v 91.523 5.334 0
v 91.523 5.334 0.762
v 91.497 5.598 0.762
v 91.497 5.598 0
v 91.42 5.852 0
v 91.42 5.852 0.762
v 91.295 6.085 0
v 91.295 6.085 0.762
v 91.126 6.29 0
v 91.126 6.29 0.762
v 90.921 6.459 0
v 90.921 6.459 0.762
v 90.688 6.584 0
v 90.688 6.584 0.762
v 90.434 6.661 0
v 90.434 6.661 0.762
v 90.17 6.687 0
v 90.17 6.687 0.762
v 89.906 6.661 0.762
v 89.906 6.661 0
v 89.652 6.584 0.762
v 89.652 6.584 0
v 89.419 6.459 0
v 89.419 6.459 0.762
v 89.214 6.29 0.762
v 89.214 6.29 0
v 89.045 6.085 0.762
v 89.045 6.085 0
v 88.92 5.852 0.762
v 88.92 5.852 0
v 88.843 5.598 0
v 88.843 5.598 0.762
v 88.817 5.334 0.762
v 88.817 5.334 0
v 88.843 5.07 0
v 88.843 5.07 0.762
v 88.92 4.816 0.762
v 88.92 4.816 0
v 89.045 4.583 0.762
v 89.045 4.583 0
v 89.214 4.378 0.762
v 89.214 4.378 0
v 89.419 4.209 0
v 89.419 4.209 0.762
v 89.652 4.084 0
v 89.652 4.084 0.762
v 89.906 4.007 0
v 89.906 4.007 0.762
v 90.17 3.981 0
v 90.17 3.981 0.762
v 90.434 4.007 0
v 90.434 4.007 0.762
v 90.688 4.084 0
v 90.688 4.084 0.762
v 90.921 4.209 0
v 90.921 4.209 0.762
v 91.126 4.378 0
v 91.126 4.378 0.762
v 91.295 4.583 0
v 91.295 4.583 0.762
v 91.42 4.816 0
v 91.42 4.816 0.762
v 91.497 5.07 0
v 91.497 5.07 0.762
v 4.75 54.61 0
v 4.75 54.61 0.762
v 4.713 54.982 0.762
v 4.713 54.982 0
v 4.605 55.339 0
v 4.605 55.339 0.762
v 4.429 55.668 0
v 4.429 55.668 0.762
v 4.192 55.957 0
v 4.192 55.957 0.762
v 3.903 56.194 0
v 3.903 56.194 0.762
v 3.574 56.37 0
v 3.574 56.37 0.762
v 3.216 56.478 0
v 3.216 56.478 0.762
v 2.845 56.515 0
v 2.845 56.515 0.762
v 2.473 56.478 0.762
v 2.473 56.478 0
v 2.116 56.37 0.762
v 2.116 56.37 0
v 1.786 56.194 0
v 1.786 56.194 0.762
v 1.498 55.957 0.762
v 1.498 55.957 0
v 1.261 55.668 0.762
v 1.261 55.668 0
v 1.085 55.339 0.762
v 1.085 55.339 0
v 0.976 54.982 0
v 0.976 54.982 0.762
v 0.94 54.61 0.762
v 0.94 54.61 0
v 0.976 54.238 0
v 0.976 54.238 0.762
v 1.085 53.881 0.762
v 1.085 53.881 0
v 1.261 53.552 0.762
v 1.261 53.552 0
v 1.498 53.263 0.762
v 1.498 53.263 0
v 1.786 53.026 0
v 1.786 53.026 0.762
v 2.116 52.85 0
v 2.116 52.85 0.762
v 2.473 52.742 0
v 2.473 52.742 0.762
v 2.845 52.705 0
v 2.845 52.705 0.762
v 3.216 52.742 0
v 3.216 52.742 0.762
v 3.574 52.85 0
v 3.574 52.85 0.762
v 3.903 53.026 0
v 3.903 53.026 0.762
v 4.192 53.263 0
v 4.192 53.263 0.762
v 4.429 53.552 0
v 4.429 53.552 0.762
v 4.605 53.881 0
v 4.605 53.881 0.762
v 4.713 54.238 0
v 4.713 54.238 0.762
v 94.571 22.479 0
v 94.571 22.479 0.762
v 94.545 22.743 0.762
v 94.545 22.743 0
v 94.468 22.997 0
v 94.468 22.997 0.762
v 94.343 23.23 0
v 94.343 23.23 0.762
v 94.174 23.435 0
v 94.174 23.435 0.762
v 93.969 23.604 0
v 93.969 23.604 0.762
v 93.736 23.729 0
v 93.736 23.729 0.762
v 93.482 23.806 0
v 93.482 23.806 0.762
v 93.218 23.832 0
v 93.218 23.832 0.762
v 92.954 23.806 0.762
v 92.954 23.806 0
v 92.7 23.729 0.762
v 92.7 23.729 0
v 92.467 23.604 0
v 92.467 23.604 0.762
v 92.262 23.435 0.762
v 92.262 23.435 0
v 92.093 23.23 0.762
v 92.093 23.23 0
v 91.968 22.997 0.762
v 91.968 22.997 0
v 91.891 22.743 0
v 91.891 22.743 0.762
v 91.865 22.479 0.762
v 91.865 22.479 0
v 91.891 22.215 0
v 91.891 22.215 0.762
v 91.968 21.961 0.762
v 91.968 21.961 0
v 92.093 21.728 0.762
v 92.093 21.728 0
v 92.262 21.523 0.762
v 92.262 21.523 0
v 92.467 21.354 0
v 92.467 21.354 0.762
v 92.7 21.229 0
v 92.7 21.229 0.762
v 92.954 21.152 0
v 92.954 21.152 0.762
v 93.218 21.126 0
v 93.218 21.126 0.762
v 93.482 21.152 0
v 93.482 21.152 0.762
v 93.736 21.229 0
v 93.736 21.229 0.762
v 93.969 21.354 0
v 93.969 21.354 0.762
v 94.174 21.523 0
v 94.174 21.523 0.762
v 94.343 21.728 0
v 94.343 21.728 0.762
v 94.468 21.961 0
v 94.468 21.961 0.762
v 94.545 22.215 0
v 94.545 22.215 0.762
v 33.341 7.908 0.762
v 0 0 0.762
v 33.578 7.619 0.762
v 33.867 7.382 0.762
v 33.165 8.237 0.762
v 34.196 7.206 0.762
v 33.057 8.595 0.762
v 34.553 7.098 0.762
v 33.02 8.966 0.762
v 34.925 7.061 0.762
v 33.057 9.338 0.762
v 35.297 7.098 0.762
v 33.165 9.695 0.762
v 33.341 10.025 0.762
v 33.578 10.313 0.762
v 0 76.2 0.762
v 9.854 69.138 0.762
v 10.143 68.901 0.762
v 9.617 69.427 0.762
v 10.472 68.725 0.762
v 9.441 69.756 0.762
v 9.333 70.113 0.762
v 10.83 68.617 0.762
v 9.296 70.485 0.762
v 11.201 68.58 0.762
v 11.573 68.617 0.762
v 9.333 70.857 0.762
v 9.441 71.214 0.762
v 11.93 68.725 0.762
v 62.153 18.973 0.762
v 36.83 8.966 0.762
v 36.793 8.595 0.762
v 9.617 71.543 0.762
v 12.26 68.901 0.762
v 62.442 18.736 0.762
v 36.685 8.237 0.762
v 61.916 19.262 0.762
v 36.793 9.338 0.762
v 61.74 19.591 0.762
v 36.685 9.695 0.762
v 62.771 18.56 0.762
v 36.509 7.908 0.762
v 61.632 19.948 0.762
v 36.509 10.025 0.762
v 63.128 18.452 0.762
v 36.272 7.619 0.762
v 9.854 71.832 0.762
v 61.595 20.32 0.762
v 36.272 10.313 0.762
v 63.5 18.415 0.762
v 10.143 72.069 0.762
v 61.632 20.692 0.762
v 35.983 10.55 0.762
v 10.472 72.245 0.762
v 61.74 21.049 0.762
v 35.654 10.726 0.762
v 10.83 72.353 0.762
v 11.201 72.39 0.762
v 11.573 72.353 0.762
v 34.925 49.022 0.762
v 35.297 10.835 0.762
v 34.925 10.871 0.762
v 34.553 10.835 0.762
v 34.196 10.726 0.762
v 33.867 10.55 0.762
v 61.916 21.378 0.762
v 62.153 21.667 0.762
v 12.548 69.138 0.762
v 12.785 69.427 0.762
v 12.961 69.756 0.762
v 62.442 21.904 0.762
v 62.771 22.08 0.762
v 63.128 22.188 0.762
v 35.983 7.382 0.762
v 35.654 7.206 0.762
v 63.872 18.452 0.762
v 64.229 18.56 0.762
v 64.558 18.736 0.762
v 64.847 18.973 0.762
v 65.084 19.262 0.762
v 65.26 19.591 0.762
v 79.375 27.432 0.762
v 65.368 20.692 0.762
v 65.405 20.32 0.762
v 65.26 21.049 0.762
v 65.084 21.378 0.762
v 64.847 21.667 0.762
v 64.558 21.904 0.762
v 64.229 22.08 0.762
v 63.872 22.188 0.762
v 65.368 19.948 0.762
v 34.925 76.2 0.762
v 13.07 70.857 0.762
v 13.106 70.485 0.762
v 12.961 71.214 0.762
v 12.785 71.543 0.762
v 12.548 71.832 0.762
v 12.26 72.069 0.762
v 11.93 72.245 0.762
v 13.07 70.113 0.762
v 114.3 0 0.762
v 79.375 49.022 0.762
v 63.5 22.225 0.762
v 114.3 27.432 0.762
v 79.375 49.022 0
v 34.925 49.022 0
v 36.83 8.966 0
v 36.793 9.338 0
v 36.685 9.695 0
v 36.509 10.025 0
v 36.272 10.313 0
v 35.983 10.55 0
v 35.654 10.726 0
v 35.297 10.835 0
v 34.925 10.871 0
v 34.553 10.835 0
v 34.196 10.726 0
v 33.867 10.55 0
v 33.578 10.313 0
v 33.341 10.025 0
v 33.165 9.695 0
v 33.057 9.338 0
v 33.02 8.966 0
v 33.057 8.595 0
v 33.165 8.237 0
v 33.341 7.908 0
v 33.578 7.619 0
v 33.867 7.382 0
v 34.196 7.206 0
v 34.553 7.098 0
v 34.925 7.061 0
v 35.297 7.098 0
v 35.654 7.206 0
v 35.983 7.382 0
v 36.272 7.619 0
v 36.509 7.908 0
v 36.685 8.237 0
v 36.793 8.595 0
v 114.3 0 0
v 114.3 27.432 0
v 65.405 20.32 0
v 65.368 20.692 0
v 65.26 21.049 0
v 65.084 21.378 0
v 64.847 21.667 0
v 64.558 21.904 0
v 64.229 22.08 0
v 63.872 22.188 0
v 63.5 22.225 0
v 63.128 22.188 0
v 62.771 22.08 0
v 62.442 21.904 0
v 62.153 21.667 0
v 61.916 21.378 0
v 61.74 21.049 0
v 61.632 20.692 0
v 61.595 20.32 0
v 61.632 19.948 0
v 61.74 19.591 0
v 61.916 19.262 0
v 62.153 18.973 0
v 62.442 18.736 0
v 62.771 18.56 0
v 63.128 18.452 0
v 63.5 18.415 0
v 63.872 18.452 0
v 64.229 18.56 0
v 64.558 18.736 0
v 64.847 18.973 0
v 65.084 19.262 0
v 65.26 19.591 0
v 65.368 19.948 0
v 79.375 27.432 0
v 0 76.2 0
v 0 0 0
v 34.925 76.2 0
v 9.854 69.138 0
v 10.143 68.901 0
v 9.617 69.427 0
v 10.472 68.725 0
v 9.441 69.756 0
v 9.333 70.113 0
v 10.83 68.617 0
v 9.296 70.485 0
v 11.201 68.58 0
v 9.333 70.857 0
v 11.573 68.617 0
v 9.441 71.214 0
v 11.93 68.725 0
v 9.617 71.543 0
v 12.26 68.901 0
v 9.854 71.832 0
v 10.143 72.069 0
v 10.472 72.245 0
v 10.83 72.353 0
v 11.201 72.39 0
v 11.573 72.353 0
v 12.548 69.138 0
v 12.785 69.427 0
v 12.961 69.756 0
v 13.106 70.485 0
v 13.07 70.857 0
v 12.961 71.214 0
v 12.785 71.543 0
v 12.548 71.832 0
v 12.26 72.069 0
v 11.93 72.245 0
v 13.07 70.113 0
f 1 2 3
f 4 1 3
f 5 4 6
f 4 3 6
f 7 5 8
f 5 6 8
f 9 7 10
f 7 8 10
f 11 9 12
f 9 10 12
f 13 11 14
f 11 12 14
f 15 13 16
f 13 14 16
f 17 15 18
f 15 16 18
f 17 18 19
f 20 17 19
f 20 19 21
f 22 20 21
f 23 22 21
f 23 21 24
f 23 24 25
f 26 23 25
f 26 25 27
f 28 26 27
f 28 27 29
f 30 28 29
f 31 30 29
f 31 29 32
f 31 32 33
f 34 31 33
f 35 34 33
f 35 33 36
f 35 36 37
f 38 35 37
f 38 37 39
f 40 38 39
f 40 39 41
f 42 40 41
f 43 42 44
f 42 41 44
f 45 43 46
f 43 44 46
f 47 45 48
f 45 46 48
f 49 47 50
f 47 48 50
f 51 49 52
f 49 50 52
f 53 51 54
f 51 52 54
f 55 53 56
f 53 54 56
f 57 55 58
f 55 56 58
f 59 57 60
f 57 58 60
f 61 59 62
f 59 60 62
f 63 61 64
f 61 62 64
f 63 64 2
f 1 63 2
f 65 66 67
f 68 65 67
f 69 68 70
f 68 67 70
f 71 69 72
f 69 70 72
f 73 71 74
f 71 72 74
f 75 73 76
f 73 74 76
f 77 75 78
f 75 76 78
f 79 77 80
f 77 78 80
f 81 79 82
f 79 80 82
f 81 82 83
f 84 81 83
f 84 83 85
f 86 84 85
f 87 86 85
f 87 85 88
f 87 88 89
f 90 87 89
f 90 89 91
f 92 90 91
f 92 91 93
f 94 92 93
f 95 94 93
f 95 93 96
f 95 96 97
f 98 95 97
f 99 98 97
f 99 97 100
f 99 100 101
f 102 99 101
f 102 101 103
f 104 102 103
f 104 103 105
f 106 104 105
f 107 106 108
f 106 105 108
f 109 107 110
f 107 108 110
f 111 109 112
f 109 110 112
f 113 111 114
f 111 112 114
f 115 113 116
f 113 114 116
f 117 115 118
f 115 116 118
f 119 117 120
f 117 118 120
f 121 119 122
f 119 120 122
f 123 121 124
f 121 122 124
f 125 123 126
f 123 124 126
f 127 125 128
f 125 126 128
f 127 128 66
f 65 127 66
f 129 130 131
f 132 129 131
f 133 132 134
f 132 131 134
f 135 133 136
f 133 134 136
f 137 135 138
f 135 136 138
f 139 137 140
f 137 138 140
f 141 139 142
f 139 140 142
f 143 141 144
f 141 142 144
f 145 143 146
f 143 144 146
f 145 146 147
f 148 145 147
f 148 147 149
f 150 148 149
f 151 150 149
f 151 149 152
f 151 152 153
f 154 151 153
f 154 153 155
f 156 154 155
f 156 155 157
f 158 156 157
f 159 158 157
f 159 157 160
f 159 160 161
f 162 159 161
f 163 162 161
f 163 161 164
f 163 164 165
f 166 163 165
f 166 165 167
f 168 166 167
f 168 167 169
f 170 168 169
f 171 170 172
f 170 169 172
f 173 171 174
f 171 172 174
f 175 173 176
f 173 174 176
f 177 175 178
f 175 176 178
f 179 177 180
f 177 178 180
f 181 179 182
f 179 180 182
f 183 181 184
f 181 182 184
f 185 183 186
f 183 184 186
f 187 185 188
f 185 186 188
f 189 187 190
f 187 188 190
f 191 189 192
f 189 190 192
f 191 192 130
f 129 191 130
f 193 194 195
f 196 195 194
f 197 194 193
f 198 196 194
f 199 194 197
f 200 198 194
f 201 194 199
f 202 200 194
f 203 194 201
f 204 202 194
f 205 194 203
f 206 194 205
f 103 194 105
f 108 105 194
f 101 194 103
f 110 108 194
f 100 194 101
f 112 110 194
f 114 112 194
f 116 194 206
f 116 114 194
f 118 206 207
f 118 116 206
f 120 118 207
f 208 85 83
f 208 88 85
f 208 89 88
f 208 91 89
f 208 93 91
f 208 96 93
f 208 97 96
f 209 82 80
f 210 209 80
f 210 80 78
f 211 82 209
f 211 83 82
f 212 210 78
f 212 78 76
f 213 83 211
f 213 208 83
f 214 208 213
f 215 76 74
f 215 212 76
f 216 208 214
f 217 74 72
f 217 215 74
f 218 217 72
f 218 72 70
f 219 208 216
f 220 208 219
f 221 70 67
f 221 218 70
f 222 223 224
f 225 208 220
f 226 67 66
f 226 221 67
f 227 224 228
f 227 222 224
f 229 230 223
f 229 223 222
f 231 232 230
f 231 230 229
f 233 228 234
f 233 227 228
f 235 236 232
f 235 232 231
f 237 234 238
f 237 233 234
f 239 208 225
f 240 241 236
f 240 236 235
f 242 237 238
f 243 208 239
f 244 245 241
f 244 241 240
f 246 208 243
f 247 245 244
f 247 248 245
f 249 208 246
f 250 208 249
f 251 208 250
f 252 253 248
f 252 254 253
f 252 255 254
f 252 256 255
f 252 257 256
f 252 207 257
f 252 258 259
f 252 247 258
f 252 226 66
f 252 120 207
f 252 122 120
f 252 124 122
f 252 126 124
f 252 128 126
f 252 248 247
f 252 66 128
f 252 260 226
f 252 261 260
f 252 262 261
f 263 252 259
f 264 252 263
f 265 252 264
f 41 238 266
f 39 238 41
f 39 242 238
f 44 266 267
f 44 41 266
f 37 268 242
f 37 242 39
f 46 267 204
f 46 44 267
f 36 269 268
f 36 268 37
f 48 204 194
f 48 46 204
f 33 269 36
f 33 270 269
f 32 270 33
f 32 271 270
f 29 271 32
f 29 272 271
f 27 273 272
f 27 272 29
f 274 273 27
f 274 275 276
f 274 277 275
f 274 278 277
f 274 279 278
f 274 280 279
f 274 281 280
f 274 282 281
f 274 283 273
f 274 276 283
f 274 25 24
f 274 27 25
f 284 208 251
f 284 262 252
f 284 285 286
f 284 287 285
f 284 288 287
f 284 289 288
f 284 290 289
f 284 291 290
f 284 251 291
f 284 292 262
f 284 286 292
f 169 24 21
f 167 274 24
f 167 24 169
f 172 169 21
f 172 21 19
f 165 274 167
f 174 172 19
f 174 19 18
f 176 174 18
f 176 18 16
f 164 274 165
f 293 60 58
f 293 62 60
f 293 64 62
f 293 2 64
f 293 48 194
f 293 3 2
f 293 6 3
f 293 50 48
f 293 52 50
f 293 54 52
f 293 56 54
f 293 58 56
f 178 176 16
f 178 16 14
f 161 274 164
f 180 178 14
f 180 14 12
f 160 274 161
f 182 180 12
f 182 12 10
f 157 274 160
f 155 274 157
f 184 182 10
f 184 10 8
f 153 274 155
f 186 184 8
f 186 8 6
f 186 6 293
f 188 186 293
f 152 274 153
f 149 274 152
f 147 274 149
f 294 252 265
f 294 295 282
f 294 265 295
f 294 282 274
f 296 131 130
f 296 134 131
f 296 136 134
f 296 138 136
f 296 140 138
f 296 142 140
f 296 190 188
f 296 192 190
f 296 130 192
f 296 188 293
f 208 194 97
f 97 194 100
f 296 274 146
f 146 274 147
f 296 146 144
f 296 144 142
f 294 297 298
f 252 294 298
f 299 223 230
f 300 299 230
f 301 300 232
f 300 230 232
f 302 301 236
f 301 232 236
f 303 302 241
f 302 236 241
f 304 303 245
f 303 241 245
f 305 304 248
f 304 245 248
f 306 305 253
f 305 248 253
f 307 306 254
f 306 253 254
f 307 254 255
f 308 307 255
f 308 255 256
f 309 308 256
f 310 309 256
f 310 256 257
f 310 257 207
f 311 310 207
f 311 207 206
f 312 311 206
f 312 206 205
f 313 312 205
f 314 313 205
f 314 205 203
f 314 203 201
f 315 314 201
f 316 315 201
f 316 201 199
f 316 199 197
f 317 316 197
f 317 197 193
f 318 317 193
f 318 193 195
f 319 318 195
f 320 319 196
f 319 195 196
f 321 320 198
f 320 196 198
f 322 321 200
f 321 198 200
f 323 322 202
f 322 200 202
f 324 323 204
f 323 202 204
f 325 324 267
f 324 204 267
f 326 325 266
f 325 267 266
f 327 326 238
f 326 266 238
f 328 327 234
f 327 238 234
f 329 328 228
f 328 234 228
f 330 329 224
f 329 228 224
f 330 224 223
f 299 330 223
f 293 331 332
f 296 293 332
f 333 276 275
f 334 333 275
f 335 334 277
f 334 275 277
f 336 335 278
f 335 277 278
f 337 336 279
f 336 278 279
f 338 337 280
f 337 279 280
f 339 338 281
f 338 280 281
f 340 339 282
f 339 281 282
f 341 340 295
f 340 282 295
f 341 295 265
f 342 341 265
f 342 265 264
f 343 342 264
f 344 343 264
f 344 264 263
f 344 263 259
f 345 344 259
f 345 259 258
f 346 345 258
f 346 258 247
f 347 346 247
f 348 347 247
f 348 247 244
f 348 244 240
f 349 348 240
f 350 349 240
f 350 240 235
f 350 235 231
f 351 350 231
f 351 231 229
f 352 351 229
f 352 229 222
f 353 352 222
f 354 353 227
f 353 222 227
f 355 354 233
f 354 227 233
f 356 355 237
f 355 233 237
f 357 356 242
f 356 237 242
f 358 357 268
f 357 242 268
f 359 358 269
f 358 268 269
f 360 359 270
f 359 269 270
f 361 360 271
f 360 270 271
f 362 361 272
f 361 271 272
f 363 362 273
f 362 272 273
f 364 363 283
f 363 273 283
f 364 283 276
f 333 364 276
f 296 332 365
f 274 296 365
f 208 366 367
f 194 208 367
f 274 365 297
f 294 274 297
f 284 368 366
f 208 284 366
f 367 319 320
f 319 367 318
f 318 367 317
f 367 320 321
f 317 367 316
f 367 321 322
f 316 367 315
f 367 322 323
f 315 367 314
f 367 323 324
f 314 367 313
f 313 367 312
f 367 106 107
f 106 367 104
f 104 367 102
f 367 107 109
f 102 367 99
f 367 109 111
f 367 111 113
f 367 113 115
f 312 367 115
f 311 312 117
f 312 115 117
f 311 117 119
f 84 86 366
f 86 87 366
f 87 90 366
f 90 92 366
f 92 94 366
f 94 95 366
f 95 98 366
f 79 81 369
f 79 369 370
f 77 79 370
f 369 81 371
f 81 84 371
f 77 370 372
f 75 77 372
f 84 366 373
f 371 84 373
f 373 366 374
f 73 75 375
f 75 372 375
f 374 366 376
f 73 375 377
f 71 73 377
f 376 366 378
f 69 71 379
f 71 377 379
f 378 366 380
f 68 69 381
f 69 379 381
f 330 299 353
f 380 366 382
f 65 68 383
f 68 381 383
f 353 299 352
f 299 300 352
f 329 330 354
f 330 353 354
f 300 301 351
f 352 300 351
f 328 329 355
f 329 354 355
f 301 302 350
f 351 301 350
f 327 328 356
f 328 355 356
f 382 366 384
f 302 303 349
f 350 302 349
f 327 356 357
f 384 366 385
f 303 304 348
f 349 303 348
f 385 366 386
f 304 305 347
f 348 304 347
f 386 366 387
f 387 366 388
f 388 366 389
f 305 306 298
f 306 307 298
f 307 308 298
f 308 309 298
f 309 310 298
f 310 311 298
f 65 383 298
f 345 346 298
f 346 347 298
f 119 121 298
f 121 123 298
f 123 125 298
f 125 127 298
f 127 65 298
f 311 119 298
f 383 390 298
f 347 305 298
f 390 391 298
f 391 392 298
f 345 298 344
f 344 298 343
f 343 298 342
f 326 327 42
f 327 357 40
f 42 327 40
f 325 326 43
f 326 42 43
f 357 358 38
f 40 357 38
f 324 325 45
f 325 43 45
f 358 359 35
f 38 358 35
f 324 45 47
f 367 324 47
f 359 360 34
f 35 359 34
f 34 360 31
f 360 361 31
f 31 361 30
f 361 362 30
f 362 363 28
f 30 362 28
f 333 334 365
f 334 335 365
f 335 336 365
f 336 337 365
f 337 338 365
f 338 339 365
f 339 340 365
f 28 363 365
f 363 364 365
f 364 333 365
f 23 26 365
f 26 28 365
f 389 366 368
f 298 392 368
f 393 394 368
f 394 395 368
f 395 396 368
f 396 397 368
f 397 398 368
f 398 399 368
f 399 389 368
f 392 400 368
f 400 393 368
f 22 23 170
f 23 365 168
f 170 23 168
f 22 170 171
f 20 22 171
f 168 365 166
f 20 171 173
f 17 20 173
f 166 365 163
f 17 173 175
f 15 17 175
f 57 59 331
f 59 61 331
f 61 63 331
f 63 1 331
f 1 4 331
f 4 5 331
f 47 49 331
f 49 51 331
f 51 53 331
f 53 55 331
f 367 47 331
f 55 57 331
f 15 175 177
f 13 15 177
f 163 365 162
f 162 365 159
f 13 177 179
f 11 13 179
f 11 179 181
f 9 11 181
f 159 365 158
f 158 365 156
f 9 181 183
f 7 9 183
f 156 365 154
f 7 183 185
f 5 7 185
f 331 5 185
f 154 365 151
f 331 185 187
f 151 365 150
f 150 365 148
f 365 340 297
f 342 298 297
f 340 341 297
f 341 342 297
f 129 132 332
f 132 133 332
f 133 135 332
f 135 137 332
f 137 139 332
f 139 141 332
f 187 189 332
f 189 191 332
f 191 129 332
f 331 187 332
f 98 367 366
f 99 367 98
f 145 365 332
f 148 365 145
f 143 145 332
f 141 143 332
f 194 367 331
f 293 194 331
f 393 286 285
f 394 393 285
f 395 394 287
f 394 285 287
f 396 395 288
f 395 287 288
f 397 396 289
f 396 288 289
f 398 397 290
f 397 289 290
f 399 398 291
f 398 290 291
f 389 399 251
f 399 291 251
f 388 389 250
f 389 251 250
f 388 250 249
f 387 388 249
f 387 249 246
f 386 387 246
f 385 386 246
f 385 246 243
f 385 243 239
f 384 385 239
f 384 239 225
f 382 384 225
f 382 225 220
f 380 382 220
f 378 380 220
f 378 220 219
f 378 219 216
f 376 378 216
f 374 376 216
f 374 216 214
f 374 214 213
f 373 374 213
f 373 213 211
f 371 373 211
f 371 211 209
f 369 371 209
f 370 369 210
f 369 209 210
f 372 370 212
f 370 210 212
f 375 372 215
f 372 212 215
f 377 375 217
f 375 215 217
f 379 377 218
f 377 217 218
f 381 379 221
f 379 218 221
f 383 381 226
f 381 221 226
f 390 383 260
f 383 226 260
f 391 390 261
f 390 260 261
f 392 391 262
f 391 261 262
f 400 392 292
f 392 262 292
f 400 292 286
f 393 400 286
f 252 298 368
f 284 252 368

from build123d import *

# Parameters (mm, degrees)
F1_DEPTH = 0.762
F2_R     = 1.905
F3_DEPTH = 0.763
F4_R     = 1.35255
F5_DEPTH = 0.763


with BuildPart() as f1:
    # F0 (on Top) → F1 (new body)
    with BuildSketch(Plane.XY):
        Polygon((0, 76.2), (0, 0), (114.3, 0), (114.3, 27.432), (79.375, 27.432), (79.375, 49.022), (34.925, 49.022), (34.925, 76.2), align=None)
    extrude(amount=F1_DEPTH)

    # F2 (on face) → F3 (cut, through all)
    with BuildSketch(Plane.XY.offset(0.762)):
        with Locations((11.2014, 70.485)):
            Circle(F2_R)
        with Locations((2.8448, 54.61)):
            Circle(F2_R)
        with Locations((34.925, 8.9662)):
            Circle(F2_R)
        with Locations((63.5, 20.32)):
            Circle(F2_R)
    extrude(amount=-F3_DEPTH, mode=Mode.SUBTRACT)

    # F4 (on face) → F5 (cut, through all)
    with BuildSketch(Plane.XY.offset(0.762)):
        with Locations((93.218, 22.479)):
            Circle(F4_R)
        with Locations((90.17, 5.334)):
            Circle(F4_R)
    extrude(amount=-F5_DEPTH, mode=Mode.SUBTRACT)


solid = f1.part
